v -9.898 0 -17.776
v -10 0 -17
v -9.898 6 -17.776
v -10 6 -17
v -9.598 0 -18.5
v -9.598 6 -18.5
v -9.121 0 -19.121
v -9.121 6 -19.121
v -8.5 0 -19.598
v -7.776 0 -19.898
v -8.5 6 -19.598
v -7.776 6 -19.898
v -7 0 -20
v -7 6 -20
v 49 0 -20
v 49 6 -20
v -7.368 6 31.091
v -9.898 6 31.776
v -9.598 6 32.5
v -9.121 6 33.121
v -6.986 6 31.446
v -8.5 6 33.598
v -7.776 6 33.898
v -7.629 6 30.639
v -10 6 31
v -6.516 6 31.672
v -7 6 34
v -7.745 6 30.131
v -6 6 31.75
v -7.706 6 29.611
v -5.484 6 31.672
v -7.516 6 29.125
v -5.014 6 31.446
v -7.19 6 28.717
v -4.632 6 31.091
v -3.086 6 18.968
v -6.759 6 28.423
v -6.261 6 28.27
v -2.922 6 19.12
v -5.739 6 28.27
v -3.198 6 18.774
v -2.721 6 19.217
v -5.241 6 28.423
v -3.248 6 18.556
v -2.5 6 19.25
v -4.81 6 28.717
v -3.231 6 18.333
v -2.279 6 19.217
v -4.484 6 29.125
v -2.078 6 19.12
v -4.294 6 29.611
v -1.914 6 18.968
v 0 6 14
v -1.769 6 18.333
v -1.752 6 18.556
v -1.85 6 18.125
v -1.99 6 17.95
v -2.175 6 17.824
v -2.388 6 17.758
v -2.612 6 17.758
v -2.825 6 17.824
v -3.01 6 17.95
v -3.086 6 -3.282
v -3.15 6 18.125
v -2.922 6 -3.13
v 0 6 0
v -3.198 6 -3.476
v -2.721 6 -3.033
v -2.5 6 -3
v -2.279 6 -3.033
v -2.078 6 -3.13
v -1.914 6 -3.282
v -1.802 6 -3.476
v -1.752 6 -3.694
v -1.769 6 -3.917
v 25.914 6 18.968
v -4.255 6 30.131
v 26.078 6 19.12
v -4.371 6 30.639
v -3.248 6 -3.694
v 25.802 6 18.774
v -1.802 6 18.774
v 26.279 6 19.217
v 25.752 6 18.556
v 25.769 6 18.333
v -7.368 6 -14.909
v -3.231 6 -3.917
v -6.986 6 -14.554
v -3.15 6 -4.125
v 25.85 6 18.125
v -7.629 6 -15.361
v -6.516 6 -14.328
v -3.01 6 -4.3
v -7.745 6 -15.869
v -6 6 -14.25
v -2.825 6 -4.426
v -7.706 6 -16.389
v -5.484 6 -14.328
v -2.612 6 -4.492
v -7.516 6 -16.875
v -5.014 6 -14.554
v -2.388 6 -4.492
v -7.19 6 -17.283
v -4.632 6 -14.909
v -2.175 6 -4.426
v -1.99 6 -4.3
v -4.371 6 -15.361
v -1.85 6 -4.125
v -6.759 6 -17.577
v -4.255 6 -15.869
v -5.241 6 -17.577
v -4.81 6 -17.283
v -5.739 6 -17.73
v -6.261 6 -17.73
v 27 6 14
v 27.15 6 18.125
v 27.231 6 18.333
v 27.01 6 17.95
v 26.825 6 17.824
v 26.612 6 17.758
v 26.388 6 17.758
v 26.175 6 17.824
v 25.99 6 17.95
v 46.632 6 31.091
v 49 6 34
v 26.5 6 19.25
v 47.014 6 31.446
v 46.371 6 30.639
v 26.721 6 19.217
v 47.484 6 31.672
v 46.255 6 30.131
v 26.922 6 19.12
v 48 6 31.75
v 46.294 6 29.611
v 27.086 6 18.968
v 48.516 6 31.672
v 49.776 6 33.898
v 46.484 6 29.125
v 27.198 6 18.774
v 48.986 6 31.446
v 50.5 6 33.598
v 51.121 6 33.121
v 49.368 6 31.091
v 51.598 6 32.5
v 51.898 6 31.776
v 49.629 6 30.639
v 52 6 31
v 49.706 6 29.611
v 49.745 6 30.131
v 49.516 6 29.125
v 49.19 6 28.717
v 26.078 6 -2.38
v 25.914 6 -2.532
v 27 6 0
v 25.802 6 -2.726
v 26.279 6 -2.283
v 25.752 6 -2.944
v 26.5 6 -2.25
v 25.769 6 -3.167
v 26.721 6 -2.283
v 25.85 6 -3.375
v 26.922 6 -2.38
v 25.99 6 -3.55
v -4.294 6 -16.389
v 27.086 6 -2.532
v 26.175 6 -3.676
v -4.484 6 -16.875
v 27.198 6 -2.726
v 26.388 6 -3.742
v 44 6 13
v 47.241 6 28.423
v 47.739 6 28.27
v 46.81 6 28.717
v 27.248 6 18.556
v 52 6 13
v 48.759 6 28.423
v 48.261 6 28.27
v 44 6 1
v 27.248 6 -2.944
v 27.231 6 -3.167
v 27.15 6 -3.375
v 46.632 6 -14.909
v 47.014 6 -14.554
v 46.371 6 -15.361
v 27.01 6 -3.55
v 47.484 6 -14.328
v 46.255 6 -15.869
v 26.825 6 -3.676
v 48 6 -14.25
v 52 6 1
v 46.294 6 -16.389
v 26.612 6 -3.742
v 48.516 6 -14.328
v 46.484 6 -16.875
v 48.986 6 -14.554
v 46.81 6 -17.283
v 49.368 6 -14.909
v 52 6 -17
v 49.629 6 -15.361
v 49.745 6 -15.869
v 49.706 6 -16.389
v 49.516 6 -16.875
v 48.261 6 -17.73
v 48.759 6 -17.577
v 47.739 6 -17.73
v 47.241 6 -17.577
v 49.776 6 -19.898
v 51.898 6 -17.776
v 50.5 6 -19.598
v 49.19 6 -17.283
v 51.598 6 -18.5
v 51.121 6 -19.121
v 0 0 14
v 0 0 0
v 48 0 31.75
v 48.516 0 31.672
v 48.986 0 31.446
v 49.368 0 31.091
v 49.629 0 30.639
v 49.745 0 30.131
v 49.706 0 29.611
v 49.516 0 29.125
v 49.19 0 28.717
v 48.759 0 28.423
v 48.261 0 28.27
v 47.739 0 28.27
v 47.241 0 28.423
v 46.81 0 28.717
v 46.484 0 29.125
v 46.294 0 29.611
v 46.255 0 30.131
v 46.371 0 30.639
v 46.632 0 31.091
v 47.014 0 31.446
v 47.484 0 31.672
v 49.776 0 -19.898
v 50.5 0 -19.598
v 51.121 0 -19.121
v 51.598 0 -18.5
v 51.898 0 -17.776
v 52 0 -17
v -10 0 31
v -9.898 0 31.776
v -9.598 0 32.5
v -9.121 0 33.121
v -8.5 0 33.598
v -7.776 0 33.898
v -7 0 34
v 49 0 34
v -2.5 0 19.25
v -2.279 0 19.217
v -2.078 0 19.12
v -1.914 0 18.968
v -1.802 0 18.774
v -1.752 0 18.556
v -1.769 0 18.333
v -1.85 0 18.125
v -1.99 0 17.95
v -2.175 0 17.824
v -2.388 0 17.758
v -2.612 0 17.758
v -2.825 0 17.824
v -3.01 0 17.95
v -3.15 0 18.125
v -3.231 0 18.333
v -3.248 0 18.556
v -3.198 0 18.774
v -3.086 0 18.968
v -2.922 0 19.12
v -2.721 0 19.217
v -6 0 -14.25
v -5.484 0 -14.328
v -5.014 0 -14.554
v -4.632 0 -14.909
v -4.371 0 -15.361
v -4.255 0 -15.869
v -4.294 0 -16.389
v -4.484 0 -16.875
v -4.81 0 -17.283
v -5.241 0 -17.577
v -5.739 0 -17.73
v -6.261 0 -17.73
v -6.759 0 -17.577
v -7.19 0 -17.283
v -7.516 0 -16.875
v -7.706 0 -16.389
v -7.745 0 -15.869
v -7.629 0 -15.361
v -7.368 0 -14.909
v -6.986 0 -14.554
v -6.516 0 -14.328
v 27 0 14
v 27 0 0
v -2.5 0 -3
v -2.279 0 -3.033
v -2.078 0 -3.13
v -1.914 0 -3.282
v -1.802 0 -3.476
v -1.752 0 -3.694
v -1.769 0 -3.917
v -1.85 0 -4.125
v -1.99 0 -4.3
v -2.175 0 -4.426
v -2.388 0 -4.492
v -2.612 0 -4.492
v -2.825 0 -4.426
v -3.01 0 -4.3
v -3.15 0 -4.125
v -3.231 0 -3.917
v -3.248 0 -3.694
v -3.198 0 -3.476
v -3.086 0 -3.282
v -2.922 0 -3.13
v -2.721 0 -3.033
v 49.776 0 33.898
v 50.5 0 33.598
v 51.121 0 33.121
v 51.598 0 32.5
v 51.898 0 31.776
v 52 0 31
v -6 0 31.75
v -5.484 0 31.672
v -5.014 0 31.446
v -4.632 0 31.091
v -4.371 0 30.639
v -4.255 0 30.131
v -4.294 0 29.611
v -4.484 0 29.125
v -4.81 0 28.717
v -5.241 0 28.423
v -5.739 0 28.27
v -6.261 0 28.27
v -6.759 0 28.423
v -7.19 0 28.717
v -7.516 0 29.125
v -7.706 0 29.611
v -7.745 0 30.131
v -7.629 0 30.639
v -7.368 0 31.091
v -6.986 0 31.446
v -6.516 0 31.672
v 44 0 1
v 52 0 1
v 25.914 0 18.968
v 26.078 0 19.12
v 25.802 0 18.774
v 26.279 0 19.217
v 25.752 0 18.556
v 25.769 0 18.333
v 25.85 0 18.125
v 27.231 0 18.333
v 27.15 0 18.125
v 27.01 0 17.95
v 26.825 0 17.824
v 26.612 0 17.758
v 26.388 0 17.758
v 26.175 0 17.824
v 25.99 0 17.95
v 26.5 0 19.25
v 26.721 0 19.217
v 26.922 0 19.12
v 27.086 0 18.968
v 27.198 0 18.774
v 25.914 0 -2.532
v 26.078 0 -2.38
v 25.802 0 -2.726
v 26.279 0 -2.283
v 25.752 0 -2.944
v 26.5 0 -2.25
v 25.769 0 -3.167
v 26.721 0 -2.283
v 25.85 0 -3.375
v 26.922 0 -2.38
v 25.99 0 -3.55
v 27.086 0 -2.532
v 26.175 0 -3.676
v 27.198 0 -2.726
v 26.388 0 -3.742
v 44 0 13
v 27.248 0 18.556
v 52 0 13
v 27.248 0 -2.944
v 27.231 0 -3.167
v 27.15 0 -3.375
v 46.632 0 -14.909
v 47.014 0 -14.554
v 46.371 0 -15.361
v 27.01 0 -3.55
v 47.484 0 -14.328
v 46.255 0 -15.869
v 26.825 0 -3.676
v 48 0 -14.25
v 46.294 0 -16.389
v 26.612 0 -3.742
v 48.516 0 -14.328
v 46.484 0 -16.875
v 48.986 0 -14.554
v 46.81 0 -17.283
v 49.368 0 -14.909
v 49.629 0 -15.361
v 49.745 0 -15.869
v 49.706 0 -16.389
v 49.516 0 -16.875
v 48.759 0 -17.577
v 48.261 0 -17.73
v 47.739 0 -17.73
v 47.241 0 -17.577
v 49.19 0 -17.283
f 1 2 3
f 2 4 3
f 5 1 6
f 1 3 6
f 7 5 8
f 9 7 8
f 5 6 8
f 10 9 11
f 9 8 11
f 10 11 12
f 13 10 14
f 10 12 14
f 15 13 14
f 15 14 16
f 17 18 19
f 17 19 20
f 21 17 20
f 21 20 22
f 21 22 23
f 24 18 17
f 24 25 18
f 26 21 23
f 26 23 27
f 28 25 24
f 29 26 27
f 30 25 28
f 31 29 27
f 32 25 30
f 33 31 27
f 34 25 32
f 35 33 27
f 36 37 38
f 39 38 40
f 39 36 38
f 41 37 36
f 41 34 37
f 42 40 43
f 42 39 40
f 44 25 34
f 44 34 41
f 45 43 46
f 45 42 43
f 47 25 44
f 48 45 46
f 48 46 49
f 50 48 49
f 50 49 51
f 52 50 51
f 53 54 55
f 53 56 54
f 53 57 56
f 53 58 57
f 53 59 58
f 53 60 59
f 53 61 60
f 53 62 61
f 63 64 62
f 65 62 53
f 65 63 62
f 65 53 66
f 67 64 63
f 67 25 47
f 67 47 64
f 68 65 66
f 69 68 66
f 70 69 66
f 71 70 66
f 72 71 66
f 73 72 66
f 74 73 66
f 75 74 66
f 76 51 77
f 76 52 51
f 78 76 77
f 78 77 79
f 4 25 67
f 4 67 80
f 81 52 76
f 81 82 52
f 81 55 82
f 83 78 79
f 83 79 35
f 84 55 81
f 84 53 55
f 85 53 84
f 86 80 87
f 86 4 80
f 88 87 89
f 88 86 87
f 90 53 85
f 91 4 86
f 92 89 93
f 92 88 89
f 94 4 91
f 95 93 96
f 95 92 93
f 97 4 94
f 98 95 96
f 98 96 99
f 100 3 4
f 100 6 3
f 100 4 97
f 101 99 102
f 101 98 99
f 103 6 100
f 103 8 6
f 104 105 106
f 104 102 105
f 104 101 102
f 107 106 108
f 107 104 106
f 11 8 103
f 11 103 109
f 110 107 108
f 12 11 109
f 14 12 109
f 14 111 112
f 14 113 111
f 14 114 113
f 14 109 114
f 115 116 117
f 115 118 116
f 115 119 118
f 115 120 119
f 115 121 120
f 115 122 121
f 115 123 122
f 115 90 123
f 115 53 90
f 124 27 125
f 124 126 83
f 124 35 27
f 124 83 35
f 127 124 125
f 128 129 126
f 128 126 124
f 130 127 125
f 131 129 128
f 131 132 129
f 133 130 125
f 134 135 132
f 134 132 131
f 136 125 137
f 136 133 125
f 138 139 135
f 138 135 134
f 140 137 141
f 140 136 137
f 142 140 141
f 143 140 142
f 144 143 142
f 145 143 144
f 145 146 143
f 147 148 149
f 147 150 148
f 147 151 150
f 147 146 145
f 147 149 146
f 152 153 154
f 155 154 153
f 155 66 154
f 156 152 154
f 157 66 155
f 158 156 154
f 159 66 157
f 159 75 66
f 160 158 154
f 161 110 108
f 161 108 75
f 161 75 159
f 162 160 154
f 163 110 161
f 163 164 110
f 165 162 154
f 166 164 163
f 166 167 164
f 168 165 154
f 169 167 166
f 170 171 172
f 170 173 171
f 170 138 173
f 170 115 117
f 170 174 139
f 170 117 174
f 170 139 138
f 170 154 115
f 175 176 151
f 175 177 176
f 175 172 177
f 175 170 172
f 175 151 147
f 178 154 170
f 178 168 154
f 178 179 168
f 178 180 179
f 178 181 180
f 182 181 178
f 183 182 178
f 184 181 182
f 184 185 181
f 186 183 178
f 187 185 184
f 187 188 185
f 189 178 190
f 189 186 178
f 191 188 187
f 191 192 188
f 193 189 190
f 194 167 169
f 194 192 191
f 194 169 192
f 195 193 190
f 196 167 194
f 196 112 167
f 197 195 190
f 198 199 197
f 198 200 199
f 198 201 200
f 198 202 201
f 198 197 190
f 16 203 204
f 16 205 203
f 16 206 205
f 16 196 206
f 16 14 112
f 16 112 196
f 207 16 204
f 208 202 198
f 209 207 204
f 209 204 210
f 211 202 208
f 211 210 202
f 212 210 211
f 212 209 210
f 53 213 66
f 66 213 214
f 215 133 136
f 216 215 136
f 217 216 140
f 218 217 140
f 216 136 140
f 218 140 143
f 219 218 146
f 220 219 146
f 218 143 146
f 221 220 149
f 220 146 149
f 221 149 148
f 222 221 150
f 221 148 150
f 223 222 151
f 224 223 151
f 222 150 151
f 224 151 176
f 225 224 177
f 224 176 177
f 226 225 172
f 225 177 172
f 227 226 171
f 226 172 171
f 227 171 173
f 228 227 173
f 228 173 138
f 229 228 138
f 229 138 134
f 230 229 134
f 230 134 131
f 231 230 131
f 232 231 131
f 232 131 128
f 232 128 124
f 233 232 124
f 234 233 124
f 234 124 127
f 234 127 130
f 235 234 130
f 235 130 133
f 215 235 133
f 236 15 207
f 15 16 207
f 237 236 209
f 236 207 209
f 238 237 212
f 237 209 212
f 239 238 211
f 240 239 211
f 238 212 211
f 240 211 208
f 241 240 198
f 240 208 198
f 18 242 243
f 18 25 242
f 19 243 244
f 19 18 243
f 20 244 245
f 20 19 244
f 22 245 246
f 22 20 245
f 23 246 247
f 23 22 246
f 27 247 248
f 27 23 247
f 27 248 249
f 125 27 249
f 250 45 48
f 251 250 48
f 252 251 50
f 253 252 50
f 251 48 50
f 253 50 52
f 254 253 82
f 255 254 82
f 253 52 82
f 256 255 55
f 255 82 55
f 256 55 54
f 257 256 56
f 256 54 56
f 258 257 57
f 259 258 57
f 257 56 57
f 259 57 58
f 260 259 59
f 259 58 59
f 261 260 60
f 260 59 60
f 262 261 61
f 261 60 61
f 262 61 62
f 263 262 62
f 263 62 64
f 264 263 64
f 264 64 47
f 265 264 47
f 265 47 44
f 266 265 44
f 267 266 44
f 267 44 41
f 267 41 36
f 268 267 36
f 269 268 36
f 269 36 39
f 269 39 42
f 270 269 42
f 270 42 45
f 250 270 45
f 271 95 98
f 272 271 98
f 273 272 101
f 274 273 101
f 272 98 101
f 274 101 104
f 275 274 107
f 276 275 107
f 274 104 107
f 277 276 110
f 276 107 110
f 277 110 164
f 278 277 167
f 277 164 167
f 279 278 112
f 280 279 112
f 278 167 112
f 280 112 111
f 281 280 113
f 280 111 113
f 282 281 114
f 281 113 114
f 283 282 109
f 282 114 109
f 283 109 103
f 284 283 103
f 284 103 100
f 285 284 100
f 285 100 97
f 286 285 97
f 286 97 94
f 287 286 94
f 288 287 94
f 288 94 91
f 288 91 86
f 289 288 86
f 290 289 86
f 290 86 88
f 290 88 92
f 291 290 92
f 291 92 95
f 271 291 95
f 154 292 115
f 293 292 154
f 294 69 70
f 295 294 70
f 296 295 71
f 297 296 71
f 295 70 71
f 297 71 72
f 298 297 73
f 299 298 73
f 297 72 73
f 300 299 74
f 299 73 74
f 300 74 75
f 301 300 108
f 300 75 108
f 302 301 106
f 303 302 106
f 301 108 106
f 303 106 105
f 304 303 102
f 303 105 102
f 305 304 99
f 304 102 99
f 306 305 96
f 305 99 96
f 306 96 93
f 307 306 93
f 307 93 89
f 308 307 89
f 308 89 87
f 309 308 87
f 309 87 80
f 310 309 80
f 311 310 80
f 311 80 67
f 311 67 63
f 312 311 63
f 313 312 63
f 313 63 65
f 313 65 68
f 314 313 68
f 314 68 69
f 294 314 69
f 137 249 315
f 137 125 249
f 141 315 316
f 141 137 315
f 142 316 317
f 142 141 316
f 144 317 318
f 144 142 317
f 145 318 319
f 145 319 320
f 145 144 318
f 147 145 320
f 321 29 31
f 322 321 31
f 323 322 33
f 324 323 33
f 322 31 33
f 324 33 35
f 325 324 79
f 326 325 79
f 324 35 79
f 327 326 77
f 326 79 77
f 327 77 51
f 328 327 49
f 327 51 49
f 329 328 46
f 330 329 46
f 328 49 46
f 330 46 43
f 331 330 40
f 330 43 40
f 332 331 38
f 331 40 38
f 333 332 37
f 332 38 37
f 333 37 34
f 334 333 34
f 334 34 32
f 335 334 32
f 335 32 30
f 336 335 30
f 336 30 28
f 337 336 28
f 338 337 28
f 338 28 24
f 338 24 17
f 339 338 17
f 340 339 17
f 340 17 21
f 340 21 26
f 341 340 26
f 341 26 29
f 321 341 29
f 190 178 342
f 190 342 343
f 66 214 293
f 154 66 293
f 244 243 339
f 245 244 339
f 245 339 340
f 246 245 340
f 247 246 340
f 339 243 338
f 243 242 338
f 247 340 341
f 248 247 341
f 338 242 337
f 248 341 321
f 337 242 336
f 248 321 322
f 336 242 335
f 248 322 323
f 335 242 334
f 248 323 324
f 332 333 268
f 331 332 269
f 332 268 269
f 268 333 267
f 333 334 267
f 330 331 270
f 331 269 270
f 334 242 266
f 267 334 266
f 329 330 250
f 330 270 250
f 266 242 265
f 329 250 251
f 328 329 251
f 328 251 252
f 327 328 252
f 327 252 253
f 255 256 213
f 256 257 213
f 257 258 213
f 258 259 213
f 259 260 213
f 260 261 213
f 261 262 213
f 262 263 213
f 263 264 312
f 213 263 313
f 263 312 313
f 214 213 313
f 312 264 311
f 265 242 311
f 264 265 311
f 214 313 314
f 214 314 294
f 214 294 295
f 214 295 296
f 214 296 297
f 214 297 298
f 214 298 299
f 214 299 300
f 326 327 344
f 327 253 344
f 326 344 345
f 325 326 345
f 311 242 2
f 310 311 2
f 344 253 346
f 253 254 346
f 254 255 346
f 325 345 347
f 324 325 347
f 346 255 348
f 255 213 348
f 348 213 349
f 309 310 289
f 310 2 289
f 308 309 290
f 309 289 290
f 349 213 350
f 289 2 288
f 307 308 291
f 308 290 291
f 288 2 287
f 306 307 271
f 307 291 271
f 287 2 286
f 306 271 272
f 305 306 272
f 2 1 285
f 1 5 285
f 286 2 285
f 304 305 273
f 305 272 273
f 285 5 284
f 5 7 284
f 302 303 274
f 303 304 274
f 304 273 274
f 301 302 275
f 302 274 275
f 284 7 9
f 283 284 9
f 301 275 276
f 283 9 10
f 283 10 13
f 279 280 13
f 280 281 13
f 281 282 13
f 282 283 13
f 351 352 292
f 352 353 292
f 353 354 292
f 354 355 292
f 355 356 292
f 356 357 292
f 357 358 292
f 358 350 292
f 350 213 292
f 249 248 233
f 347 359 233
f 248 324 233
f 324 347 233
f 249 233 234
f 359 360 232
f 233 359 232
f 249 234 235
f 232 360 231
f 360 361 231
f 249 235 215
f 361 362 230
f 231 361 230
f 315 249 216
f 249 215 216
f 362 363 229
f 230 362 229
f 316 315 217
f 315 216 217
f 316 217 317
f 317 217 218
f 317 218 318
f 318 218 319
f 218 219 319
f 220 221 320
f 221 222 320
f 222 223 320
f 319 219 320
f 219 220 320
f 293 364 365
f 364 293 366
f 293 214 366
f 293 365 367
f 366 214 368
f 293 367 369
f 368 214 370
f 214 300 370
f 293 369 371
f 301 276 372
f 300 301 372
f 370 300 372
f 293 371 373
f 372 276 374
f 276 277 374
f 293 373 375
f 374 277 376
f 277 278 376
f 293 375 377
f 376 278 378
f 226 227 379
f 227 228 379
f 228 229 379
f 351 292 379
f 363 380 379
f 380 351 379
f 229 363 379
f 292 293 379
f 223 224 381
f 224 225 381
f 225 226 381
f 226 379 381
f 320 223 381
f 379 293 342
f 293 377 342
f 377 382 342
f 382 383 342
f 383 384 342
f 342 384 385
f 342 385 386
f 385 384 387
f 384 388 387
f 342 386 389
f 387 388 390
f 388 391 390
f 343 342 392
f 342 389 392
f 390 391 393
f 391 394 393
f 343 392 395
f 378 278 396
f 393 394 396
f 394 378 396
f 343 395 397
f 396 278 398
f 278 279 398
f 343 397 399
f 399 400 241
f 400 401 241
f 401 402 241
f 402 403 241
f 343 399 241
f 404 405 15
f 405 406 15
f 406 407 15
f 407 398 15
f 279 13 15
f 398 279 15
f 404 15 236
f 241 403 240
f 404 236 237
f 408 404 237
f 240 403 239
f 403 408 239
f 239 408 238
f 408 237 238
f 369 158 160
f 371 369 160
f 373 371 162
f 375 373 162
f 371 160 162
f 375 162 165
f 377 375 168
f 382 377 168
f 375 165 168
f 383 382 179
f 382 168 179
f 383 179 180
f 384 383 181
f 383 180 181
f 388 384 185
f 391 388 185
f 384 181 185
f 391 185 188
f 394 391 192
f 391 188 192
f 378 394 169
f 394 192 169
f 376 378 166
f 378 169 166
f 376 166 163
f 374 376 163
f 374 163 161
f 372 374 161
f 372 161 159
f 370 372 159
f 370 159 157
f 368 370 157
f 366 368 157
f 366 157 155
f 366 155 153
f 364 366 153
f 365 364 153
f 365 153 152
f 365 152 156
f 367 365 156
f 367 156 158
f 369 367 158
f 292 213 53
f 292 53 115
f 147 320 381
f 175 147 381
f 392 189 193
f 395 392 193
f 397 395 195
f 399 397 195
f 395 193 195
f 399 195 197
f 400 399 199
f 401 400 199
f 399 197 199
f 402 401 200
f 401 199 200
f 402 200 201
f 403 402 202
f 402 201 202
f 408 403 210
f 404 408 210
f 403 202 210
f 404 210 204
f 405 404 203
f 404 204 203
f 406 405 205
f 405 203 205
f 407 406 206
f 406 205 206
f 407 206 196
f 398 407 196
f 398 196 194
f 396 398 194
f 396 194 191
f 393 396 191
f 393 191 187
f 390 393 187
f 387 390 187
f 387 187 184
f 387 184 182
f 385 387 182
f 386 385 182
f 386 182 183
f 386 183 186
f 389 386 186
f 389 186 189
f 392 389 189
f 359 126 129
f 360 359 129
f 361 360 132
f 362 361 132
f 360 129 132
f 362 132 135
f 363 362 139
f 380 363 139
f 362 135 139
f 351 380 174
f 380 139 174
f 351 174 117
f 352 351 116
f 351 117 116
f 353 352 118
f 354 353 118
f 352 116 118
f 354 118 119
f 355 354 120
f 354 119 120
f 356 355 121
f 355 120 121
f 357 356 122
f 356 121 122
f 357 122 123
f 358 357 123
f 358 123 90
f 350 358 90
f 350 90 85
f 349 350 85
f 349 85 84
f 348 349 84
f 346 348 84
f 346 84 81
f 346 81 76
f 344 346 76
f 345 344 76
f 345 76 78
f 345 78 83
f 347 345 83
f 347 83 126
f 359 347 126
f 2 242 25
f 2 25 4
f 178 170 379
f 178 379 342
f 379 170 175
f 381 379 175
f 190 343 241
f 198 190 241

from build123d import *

# Parameters (mm, degrees)
SKETCH1_W           = 62
SKETCH1_H           = 54
SKETCH1_W_2         = 27
SKETCH1_H_2         = 14
BOSS_EXTRUDE1_DEPTH = 6
SKETCH2_R           = 0.75
CUT_EXTRUDE1_DEPTH  = 63.417946137
SKETCH3_R           = 1.75
CUT_EXTRUDE2_DEPTH  = 63.417946137
FILLET1_R           = 3
SKETCH4_W           = 16
SKETCH4_H           = 12
CUT_EXTRUDE3_DEPTH  = 63.417946137


with BuildPart() as part:
    # Sketch1 → Boss-Extrude1 (new body)
    with BuildSketch(Plane(origin=(0, 0, 0), x_dir=(1, 0, 0), z_dir=(0, 1, 0))):
        with Locations((21, -7)):
            Rectangle(SKETCH1_W, SKETCH1_H)
        with Locations((13.5, -7)):
            Rectangle(SKETCH1_W_2, SKETCH1_H_2, mode=Mode.SUBTRACT)
    extrude(amount=BOSS_EXTRUDE1_DEPTH)

    # Sketch2 → Cut-Extrude1 (cut, through all)
    with BuildSketch(Plane(origin=(0, 6, 0), x_dir=(1, 0, 0), z_dir=(0, 1, 0))):
        with Locations(Location((-2.5, 3.75, 0), (0, 0, 270))):
            Circle(SKETCH2_R)
        with Locations(Location((-2.5, -18.5, 0), (0, 0, 270))):
            Circle(SKETCH2_R)
        with Locations(Location((26.5, 3, 0), (0, 0, 270))):
            Circle(SKETCH2_R)
        with Locations(Location((26.5, -18.5, 0), (0, 0, 270))):
            Circle(SKETCH2_R)
    extrude(amount=-CUT_EXTRUDE1_DEPTH, mode=Mode.SUBTRACT)

    # Sketch3 → Cut-Extrude2 (cut, through all)
    with BuildSketch(Plane(origin=(0, 6, 0), x_dir=(1, 0, 0), z_dir=(0, 1, 0))):
        with Locations(Location((-6, 16, 0), (0, 0, 270))):
            Circle(SKETCH3_R)
        with Locations(Location((-6, -30, 0), (0, 0, 270))):
            Circle(SKETCH3_R)
        with Locations(Location((48, 16, 0), (0, 0, 270))):
            Circle(SKETCH3_R)
        with Locations(Location((48, -30, 0), (0, 0, 270))):
            Circle(SKETCH3_R)
    extrude(amount=-CUT_EXTRUDE2_DEPTH, mode=Mode.SUBTRACT)

    # Fillet1
    fillet1_edges = [part.edges().sort_by_distance(p)[0] for p in [
        (-10, 3, -20),
        (52, 3, -20),
        (52, 3, 34),
        (-10, 3, 34),
    ]]
    fillet(fillet1_edges, radius=FILLET1_R)

    # Sketch4 → Cut-Extrude3 (cut, through all)
    with BuildSketch(Plane(origin=(0, 6, 0), x_dir=(1, 0, 0), z_dir=(0, 1, 0))):
        with Locations((52, -7)):
            Rectangle(SKETCH4_W, SKETCH4_H)
    extrude(amount=-CUT_EXTRUDE3_DEPTH, mode=Mode.SUBTRACT)


solid = part.part
